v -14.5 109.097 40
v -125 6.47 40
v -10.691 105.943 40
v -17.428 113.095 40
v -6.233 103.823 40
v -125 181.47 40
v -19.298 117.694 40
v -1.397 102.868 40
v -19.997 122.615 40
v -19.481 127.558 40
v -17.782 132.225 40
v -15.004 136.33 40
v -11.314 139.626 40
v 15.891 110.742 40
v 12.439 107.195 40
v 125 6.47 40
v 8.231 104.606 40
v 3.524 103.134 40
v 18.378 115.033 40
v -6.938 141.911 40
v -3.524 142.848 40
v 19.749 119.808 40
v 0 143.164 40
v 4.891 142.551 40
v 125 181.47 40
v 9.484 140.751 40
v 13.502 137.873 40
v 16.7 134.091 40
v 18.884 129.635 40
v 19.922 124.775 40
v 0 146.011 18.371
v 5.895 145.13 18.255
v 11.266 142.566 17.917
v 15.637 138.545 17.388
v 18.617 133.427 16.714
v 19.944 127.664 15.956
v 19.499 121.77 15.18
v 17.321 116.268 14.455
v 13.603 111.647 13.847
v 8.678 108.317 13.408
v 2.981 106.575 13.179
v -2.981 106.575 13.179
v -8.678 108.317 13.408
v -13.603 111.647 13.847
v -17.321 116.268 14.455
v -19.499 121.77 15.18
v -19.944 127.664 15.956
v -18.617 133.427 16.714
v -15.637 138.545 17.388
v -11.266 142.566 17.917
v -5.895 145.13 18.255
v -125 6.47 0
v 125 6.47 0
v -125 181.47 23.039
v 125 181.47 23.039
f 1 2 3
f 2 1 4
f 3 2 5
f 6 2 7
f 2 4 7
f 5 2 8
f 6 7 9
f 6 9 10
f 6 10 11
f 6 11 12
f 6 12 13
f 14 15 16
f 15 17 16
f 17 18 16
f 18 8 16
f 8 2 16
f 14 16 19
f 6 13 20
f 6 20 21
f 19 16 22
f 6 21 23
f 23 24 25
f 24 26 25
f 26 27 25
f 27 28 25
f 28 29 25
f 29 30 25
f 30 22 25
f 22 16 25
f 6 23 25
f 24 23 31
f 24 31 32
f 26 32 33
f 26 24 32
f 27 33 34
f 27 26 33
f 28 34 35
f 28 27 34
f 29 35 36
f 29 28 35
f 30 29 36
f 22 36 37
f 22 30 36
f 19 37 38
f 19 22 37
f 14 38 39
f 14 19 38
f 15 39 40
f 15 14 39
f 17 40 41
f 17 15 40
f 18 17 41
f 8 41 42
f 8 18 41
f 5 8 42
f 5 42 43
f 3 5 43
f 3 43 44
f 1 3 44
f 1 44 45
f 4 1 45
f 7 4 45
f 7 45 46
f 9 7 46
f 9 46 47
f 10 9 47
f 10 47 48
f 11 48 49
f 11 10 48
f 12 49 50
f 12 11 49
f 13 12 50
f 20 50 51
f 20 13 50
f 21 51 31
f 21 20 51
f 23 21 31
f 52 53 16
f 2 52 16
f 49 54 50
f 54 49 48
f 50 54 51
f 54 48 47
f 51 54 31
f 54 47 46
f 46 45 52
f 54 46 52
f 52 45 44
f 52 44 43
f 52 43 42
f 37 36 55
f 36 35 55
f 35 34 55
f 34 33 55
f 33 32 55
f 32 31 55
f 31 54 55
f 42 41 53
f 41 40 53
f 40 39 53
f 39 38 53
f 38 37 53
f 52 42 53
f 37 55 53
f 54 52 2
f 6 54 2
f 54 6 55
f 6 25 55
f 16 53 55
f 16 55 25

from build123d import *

# Parameters (mm, degrees)
BOSS_EXTRUDE2_DEPTH     = 125
CUT_EXTRUDE1_DEPTH      = 225.548075315
CUT_EXTRUDE1_DEPTH_BACK = 225.548075315
SKETCH9_R               = 20


with BuildPart() as part:
    # Sketch7 → Boss-Extrude2 (new, symmetric)
    with BuildSketch(Plane(origin=(0, 0, 0), x_dir=(0, 0, -1), z_dir=(1, 0, 0))):
        Polygon((0, 6.47), (-40, 6.47), (-40, 181.47), (-23.039187078, 181.47), align=None)
    extrude(amount=BOSS_EXTRUDE2_DEPTH, both=True)

    # Sketch9 → Cut-Extrude1 (cut, two sides: drawn at the far end of the back side and taken through both)
    with BuildSketch(Plane(origin=(0, 0.893387105, -6.785948779), x_dir=(-1, 0, 0), z_dir=(0, 0.130526192220056, -0.9914448613738098)).offset(-CUT_EXTRUDE1_DEPTH_BACK)):
        with Locations(Location((0, 127.16, 0), (0, 0, 90))):
            Circle(SKETCH9_R)
    extrude(amount=CUT_EXTRUDE1_DEPTH + CUT_EXTRUDE1_DEPTH_BACK, mode=Mode.SUBTRACT)


solid = part.part
